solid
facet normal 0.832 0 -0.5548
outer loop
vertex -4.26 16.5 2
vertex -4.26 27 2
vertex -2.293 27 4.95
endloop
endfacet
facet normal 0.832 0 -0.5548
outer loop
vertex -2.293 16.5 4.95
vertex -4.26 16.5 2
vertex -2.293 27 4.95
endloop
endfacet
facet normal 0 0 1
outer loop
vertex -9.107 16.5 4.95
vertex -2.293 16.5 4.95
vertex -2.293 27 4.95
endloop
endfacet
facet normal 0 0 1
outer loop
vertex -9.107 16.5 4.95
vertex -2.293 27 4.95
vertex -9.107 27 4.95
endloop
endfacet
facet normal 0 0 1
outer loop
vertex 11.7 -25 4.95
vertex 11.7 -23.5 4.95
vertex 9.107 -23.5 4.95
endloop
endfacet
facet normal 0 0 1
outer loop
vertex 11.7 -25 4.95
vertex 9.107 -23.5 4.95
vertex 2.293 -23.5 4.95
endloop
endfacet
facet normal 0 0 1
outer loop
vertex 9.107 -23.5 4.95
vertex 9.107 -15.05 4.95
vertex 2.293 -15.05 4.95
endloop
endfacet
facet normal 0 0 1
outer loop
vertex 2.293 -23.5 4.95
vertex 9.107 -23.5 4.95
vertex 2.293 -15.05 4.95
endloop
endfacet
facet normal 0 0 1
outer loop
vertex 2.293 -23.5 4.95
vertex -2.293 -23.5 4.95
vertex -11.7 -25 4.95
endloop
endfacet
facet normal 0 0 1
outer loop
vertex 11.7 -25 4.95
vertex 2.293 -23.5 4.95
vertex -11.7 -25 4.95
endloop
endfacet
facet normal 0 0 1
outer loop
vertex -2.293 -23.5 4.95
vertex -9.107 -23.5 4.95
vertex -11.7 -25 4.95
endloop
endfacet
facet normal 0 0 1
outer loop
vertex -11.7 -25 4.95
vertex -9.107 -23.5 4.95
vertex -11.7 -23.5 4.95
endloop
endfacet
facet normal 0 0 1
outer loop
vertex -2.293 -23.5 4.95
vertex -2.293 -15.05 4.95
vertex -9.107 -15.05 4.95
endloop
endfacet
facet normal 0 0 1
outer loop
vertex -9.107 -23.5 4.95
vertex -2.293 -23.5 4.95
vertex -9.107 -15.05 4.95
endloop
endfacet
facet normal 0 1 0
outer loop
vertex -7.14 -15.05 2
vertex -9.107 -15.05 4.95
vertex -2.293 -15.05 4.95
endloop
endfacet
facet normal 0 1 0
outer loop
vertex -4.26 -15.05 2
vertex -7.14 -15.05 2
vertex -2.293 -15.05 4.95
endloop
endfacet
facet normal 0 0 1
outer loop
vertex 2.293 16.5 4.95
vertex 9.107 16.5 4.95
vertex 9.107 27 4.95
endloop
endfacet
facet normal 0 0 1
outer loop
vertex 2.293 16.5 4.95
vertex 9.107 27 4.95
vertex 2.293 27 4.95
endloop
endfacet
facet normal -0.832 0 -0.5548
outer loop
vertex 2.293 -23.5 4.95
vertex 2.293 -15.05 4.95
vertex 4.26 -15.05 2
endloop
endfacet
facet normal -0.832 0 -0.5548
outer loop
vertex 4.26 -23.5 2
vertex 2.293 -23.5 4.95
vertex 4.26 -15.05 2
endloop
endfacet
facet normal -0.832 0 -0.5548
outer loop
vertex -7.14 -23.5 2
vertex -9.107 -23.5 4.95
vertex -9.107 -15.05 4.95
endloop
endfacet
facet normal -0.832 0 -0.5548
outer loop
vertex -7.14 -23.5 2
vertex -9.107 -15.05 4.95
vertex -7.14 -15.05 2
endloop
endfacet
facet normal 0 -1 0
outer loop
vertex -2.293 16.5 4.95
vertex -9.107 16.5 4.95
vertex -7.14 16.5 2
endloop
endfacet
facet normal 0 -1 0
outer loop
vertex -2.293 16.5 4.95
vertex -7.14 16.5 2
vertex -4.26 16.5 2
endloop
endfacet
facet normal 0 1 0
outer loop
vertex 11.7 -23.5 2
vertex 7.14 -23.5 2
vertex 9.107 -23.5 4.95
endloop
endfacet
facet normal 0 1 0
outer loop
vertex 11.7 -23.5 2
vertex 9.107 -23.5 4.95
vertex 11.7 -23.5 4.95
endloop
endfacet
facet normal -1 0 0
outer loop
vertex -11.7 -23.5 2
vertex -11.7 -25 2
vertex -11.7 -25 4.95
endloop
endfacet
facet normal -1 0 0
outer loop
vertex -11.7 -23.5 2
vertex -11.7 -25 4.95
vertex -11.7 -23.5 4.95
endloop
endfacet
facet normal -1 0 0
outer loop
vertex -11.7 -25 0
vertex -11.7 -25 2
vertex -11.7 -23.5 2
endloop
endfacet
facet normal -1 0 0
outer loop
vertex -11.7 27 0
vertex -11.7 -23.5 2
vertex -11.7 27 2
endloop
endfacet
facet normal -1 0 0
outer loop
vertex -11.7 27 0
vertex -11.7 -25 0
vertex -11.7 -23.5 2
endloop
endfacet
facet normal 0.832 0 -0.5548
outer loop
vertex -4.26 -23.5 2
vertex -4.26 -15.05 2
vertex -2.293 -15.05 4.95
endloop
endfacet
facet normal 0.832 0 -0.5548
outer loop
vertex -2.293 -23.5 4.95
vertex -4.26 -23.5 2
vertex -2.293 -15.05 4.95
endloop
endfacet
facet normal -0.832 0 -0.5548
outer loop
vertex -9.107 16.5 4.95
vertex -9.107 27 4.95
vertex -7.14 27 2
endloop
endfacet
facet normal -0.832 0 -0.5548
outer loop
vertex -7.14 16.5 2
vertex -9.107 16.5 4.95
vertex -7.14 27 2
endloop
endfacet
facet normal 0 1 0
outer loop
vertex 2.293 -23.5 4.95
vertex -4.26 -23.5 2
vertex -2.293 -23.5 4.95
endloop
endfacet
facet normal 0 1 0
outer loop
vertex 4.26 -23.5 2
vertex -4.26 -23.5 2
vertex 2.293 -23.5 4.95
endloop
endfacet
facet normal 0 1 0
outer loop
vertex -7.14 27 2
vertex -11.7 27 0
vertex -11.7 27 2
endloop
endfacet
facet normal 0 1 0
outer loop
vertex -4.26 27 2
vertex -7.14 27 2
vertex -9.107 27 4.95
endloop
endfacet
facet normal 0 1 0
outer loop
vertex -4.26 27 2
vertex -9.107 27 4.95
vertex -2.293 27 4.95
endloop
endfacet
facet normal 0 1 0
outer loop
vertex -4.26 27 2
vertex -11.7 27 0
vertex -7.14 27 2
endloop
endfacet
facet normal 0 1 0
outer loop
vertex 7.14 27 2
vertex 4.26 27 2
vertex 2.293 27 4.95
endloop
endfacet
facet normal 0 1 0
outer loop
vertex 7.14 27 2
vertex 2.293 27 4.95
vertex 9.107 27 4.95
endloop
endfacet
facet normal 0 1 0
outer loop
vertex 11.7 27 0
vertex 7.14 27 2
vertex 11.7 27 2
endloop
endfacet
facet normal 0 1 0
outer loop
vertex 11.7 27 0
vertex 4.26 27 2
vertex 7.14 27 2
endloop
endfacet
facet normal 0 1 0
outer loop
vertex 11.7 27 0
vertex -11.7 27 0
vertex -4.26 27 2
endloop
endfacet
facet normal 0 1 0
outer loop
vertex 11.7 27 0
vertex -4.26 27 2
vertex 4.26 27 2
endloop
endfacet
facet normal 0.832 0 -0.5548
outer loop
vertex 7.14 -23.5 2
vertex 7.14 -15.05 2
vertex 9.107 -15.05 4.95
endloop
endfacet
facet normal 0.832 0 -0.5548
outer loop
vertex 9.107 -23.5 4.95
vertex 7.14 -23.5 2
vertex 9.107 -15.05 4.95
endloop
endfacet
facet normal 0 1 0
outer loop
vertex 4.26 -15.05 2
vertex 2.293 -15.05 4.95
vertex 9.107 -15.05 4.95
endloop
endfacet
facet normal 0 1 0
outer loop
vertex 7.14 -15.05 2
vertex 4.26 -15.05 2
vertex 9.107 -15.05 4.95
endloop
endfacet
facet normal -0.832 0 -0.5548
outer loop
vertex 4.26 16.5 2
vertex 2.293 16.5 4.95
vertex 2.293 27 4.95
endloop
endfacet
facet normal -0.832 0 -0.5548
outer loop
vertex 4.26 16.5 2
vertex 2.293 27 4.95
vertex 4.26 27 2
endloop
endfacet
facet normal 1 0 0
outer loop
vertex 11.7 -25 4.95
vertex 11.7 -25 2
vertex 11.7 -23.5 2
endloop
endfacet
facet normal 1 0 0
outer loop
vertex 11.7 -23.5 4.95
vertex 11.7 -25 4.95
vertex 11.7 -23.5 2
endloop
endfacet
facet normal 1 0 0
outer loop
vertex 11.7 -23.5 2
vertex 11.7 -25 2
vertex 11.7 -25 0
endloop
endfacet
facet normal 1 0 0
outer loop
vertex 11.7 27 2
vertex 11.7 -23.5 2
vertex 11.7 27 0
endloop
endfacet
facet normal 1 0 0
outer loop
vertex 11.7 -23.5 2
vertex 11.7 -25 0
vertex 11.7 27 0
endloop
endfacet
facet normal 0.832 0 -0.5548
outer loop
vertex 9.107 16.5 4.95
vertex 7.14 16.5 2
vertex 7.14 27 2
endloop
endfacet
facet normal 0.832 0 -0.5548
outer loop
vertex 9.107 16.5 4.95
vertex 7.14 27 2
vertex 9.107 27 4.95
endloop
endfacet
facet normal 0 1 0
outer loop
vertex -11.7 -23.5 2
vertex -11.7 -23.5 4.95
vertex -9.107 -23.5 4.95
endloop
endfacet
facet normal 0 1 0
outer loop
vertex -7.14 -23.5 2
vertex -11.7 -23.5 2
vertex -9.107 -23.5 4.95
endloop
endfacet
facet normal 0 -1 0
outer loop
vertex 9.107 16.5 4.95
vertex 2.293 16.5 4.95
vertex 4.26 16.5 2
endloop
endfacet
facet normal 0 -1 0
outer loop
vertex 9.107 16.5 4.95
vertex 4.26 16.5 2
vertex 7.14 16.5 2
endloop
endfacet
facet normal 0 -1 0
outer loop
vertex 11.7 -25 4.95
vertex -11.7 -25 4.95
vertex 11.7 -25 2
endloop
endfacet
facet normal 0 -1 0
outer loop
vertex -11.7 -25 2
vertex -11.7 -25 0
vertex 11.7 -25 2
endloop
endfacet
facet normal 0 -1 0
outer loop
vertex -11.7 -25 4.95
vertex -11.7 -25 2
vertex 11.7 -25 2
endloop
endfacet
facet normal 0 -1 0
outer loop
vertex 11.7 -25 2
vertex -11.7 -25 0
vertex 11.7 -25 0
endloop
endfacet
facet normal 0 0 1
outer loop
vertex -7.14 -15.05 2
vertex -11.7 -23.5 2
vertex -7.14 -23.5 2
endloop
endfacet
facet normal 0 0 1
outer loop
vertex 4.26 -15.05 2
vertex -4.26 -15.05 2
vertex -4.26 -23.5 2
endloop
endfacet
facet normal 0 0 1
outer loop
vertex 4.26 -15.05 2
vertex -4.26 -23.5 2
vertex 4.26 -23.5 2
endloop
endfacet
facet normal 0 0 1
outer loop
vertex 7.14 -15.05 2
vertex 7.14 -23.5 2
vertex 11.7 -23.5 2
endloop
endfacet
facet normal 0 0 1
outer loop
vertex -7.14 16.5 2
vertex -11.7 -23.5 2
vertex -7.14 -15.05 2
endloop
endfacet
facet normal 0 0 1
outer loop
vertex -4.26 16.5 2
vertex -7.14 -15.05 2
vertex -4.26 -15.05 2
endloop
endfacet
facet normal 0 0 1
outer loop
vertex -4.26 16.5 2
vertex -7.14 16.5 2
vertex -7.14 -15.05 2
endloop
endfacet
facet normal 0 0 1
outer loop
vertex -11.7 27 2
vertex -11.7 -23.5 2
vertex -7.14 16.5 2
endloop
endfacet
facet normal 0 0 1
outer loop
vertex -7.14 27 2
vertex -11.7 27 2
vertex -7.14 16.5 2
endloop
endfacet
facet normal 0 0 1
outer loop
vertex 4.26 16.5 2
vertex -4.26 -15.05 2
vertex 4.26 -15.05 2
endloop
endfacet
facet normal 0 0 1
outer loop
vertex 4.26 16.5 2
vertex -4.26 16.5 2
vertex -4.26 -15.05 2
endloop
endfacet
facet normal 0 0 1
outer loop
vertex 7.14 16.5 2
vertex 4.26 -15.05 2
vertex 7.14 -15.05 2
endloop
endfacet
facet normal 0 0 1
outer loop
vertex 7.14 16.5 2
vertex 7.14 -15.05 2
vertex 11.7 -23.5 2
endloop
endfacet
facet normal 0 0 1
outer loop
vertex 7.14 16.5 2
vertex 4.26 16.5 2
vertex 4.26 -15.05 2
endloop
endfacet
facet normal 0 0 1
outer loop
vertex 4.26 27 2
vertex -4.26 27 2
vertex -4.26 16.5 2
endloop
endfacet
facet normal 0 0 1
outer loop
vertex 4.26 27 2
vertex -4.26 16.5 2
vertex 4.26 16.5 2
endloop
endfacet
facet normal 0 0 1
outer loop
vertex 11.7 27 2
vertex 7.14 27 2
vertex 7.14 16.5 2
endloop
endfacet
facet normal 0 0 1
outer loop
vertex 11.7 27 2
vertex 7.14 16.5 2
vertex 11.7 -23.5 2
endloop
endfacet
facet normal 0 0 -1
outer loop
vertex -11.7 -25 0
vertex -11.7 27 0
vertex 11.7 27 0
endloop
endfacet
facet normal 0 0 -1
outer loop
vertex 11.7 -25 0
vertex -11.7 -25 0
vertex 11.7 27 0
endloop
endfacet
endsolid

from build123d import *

# Parameters (mm, degrees)
F0_W     = 23.4
F0_H     = 52
F1_DEPTH = 2
F3_START = 15.05
F3_DEPTH = 9.95
F4_W     = 4.5600925213
F4_H     = 1.5
F4_W_2   = 8.5201850425
F5_DEPTH = 2.95
F6_START = -16.5
F6_DEPTH = 10.5


with BuildPart() as f1:
    # F0 (on Top) → F1 (new body)
    with BuildSketch(Plane.XY):
        with Locations((0, 1)):
            Rectangle(F0_W, F0_H)
    extrude(amount=F1_DEPTH)

    # F2 (on Front) → F3 (join)
    with BuildSketch(Plane.XZ.offset(F3_START)):
        Polygon((2.2934258546, 4.95), (4.2600925213, 2), (7.1399074787, 2), (9.1065741454, 4.95), align=None)
        Polygon((-4.2600925213, 2), (-2.2934258546, 4.95), (-9.1065741454, 4.95), (-7.1399074787, 2), align=None)
    extrude(amount=F3_DEPTH)

    # F4 (on face) → F5 (join)
    with BuildSketch(Plane.XY.offset(2)):
        with Locations((9.4199537394, -24.25)):
            Rectangle(F4_W, F4_H)
        with Locations((0, -24.25)):
            Rectangle(F4_W_2, F4_H)
        with Locations((-9.4199537394, -24.25)):
            Rectangle(F4_W, F4_H)
    extrude(amount=F5_DEPTH)

    # F2 (on Front) → F6 (join)
    with BuildSketch(Plane.XZ.offset(F6_START)):
        Polygon((2.2934258546, 4.95), (4.2600925213, 2), (7.1399074787, 2), (9.1065741454, 4.95), align=None)
        Polygon((-4.2600925213, 2), (-2.2934258546, 4.95), (-9.1065741454, 4.95), (-7.1399074787, 2), align=None)
    extrude(amount=-F6_DEPTH)


solid = f1.part
